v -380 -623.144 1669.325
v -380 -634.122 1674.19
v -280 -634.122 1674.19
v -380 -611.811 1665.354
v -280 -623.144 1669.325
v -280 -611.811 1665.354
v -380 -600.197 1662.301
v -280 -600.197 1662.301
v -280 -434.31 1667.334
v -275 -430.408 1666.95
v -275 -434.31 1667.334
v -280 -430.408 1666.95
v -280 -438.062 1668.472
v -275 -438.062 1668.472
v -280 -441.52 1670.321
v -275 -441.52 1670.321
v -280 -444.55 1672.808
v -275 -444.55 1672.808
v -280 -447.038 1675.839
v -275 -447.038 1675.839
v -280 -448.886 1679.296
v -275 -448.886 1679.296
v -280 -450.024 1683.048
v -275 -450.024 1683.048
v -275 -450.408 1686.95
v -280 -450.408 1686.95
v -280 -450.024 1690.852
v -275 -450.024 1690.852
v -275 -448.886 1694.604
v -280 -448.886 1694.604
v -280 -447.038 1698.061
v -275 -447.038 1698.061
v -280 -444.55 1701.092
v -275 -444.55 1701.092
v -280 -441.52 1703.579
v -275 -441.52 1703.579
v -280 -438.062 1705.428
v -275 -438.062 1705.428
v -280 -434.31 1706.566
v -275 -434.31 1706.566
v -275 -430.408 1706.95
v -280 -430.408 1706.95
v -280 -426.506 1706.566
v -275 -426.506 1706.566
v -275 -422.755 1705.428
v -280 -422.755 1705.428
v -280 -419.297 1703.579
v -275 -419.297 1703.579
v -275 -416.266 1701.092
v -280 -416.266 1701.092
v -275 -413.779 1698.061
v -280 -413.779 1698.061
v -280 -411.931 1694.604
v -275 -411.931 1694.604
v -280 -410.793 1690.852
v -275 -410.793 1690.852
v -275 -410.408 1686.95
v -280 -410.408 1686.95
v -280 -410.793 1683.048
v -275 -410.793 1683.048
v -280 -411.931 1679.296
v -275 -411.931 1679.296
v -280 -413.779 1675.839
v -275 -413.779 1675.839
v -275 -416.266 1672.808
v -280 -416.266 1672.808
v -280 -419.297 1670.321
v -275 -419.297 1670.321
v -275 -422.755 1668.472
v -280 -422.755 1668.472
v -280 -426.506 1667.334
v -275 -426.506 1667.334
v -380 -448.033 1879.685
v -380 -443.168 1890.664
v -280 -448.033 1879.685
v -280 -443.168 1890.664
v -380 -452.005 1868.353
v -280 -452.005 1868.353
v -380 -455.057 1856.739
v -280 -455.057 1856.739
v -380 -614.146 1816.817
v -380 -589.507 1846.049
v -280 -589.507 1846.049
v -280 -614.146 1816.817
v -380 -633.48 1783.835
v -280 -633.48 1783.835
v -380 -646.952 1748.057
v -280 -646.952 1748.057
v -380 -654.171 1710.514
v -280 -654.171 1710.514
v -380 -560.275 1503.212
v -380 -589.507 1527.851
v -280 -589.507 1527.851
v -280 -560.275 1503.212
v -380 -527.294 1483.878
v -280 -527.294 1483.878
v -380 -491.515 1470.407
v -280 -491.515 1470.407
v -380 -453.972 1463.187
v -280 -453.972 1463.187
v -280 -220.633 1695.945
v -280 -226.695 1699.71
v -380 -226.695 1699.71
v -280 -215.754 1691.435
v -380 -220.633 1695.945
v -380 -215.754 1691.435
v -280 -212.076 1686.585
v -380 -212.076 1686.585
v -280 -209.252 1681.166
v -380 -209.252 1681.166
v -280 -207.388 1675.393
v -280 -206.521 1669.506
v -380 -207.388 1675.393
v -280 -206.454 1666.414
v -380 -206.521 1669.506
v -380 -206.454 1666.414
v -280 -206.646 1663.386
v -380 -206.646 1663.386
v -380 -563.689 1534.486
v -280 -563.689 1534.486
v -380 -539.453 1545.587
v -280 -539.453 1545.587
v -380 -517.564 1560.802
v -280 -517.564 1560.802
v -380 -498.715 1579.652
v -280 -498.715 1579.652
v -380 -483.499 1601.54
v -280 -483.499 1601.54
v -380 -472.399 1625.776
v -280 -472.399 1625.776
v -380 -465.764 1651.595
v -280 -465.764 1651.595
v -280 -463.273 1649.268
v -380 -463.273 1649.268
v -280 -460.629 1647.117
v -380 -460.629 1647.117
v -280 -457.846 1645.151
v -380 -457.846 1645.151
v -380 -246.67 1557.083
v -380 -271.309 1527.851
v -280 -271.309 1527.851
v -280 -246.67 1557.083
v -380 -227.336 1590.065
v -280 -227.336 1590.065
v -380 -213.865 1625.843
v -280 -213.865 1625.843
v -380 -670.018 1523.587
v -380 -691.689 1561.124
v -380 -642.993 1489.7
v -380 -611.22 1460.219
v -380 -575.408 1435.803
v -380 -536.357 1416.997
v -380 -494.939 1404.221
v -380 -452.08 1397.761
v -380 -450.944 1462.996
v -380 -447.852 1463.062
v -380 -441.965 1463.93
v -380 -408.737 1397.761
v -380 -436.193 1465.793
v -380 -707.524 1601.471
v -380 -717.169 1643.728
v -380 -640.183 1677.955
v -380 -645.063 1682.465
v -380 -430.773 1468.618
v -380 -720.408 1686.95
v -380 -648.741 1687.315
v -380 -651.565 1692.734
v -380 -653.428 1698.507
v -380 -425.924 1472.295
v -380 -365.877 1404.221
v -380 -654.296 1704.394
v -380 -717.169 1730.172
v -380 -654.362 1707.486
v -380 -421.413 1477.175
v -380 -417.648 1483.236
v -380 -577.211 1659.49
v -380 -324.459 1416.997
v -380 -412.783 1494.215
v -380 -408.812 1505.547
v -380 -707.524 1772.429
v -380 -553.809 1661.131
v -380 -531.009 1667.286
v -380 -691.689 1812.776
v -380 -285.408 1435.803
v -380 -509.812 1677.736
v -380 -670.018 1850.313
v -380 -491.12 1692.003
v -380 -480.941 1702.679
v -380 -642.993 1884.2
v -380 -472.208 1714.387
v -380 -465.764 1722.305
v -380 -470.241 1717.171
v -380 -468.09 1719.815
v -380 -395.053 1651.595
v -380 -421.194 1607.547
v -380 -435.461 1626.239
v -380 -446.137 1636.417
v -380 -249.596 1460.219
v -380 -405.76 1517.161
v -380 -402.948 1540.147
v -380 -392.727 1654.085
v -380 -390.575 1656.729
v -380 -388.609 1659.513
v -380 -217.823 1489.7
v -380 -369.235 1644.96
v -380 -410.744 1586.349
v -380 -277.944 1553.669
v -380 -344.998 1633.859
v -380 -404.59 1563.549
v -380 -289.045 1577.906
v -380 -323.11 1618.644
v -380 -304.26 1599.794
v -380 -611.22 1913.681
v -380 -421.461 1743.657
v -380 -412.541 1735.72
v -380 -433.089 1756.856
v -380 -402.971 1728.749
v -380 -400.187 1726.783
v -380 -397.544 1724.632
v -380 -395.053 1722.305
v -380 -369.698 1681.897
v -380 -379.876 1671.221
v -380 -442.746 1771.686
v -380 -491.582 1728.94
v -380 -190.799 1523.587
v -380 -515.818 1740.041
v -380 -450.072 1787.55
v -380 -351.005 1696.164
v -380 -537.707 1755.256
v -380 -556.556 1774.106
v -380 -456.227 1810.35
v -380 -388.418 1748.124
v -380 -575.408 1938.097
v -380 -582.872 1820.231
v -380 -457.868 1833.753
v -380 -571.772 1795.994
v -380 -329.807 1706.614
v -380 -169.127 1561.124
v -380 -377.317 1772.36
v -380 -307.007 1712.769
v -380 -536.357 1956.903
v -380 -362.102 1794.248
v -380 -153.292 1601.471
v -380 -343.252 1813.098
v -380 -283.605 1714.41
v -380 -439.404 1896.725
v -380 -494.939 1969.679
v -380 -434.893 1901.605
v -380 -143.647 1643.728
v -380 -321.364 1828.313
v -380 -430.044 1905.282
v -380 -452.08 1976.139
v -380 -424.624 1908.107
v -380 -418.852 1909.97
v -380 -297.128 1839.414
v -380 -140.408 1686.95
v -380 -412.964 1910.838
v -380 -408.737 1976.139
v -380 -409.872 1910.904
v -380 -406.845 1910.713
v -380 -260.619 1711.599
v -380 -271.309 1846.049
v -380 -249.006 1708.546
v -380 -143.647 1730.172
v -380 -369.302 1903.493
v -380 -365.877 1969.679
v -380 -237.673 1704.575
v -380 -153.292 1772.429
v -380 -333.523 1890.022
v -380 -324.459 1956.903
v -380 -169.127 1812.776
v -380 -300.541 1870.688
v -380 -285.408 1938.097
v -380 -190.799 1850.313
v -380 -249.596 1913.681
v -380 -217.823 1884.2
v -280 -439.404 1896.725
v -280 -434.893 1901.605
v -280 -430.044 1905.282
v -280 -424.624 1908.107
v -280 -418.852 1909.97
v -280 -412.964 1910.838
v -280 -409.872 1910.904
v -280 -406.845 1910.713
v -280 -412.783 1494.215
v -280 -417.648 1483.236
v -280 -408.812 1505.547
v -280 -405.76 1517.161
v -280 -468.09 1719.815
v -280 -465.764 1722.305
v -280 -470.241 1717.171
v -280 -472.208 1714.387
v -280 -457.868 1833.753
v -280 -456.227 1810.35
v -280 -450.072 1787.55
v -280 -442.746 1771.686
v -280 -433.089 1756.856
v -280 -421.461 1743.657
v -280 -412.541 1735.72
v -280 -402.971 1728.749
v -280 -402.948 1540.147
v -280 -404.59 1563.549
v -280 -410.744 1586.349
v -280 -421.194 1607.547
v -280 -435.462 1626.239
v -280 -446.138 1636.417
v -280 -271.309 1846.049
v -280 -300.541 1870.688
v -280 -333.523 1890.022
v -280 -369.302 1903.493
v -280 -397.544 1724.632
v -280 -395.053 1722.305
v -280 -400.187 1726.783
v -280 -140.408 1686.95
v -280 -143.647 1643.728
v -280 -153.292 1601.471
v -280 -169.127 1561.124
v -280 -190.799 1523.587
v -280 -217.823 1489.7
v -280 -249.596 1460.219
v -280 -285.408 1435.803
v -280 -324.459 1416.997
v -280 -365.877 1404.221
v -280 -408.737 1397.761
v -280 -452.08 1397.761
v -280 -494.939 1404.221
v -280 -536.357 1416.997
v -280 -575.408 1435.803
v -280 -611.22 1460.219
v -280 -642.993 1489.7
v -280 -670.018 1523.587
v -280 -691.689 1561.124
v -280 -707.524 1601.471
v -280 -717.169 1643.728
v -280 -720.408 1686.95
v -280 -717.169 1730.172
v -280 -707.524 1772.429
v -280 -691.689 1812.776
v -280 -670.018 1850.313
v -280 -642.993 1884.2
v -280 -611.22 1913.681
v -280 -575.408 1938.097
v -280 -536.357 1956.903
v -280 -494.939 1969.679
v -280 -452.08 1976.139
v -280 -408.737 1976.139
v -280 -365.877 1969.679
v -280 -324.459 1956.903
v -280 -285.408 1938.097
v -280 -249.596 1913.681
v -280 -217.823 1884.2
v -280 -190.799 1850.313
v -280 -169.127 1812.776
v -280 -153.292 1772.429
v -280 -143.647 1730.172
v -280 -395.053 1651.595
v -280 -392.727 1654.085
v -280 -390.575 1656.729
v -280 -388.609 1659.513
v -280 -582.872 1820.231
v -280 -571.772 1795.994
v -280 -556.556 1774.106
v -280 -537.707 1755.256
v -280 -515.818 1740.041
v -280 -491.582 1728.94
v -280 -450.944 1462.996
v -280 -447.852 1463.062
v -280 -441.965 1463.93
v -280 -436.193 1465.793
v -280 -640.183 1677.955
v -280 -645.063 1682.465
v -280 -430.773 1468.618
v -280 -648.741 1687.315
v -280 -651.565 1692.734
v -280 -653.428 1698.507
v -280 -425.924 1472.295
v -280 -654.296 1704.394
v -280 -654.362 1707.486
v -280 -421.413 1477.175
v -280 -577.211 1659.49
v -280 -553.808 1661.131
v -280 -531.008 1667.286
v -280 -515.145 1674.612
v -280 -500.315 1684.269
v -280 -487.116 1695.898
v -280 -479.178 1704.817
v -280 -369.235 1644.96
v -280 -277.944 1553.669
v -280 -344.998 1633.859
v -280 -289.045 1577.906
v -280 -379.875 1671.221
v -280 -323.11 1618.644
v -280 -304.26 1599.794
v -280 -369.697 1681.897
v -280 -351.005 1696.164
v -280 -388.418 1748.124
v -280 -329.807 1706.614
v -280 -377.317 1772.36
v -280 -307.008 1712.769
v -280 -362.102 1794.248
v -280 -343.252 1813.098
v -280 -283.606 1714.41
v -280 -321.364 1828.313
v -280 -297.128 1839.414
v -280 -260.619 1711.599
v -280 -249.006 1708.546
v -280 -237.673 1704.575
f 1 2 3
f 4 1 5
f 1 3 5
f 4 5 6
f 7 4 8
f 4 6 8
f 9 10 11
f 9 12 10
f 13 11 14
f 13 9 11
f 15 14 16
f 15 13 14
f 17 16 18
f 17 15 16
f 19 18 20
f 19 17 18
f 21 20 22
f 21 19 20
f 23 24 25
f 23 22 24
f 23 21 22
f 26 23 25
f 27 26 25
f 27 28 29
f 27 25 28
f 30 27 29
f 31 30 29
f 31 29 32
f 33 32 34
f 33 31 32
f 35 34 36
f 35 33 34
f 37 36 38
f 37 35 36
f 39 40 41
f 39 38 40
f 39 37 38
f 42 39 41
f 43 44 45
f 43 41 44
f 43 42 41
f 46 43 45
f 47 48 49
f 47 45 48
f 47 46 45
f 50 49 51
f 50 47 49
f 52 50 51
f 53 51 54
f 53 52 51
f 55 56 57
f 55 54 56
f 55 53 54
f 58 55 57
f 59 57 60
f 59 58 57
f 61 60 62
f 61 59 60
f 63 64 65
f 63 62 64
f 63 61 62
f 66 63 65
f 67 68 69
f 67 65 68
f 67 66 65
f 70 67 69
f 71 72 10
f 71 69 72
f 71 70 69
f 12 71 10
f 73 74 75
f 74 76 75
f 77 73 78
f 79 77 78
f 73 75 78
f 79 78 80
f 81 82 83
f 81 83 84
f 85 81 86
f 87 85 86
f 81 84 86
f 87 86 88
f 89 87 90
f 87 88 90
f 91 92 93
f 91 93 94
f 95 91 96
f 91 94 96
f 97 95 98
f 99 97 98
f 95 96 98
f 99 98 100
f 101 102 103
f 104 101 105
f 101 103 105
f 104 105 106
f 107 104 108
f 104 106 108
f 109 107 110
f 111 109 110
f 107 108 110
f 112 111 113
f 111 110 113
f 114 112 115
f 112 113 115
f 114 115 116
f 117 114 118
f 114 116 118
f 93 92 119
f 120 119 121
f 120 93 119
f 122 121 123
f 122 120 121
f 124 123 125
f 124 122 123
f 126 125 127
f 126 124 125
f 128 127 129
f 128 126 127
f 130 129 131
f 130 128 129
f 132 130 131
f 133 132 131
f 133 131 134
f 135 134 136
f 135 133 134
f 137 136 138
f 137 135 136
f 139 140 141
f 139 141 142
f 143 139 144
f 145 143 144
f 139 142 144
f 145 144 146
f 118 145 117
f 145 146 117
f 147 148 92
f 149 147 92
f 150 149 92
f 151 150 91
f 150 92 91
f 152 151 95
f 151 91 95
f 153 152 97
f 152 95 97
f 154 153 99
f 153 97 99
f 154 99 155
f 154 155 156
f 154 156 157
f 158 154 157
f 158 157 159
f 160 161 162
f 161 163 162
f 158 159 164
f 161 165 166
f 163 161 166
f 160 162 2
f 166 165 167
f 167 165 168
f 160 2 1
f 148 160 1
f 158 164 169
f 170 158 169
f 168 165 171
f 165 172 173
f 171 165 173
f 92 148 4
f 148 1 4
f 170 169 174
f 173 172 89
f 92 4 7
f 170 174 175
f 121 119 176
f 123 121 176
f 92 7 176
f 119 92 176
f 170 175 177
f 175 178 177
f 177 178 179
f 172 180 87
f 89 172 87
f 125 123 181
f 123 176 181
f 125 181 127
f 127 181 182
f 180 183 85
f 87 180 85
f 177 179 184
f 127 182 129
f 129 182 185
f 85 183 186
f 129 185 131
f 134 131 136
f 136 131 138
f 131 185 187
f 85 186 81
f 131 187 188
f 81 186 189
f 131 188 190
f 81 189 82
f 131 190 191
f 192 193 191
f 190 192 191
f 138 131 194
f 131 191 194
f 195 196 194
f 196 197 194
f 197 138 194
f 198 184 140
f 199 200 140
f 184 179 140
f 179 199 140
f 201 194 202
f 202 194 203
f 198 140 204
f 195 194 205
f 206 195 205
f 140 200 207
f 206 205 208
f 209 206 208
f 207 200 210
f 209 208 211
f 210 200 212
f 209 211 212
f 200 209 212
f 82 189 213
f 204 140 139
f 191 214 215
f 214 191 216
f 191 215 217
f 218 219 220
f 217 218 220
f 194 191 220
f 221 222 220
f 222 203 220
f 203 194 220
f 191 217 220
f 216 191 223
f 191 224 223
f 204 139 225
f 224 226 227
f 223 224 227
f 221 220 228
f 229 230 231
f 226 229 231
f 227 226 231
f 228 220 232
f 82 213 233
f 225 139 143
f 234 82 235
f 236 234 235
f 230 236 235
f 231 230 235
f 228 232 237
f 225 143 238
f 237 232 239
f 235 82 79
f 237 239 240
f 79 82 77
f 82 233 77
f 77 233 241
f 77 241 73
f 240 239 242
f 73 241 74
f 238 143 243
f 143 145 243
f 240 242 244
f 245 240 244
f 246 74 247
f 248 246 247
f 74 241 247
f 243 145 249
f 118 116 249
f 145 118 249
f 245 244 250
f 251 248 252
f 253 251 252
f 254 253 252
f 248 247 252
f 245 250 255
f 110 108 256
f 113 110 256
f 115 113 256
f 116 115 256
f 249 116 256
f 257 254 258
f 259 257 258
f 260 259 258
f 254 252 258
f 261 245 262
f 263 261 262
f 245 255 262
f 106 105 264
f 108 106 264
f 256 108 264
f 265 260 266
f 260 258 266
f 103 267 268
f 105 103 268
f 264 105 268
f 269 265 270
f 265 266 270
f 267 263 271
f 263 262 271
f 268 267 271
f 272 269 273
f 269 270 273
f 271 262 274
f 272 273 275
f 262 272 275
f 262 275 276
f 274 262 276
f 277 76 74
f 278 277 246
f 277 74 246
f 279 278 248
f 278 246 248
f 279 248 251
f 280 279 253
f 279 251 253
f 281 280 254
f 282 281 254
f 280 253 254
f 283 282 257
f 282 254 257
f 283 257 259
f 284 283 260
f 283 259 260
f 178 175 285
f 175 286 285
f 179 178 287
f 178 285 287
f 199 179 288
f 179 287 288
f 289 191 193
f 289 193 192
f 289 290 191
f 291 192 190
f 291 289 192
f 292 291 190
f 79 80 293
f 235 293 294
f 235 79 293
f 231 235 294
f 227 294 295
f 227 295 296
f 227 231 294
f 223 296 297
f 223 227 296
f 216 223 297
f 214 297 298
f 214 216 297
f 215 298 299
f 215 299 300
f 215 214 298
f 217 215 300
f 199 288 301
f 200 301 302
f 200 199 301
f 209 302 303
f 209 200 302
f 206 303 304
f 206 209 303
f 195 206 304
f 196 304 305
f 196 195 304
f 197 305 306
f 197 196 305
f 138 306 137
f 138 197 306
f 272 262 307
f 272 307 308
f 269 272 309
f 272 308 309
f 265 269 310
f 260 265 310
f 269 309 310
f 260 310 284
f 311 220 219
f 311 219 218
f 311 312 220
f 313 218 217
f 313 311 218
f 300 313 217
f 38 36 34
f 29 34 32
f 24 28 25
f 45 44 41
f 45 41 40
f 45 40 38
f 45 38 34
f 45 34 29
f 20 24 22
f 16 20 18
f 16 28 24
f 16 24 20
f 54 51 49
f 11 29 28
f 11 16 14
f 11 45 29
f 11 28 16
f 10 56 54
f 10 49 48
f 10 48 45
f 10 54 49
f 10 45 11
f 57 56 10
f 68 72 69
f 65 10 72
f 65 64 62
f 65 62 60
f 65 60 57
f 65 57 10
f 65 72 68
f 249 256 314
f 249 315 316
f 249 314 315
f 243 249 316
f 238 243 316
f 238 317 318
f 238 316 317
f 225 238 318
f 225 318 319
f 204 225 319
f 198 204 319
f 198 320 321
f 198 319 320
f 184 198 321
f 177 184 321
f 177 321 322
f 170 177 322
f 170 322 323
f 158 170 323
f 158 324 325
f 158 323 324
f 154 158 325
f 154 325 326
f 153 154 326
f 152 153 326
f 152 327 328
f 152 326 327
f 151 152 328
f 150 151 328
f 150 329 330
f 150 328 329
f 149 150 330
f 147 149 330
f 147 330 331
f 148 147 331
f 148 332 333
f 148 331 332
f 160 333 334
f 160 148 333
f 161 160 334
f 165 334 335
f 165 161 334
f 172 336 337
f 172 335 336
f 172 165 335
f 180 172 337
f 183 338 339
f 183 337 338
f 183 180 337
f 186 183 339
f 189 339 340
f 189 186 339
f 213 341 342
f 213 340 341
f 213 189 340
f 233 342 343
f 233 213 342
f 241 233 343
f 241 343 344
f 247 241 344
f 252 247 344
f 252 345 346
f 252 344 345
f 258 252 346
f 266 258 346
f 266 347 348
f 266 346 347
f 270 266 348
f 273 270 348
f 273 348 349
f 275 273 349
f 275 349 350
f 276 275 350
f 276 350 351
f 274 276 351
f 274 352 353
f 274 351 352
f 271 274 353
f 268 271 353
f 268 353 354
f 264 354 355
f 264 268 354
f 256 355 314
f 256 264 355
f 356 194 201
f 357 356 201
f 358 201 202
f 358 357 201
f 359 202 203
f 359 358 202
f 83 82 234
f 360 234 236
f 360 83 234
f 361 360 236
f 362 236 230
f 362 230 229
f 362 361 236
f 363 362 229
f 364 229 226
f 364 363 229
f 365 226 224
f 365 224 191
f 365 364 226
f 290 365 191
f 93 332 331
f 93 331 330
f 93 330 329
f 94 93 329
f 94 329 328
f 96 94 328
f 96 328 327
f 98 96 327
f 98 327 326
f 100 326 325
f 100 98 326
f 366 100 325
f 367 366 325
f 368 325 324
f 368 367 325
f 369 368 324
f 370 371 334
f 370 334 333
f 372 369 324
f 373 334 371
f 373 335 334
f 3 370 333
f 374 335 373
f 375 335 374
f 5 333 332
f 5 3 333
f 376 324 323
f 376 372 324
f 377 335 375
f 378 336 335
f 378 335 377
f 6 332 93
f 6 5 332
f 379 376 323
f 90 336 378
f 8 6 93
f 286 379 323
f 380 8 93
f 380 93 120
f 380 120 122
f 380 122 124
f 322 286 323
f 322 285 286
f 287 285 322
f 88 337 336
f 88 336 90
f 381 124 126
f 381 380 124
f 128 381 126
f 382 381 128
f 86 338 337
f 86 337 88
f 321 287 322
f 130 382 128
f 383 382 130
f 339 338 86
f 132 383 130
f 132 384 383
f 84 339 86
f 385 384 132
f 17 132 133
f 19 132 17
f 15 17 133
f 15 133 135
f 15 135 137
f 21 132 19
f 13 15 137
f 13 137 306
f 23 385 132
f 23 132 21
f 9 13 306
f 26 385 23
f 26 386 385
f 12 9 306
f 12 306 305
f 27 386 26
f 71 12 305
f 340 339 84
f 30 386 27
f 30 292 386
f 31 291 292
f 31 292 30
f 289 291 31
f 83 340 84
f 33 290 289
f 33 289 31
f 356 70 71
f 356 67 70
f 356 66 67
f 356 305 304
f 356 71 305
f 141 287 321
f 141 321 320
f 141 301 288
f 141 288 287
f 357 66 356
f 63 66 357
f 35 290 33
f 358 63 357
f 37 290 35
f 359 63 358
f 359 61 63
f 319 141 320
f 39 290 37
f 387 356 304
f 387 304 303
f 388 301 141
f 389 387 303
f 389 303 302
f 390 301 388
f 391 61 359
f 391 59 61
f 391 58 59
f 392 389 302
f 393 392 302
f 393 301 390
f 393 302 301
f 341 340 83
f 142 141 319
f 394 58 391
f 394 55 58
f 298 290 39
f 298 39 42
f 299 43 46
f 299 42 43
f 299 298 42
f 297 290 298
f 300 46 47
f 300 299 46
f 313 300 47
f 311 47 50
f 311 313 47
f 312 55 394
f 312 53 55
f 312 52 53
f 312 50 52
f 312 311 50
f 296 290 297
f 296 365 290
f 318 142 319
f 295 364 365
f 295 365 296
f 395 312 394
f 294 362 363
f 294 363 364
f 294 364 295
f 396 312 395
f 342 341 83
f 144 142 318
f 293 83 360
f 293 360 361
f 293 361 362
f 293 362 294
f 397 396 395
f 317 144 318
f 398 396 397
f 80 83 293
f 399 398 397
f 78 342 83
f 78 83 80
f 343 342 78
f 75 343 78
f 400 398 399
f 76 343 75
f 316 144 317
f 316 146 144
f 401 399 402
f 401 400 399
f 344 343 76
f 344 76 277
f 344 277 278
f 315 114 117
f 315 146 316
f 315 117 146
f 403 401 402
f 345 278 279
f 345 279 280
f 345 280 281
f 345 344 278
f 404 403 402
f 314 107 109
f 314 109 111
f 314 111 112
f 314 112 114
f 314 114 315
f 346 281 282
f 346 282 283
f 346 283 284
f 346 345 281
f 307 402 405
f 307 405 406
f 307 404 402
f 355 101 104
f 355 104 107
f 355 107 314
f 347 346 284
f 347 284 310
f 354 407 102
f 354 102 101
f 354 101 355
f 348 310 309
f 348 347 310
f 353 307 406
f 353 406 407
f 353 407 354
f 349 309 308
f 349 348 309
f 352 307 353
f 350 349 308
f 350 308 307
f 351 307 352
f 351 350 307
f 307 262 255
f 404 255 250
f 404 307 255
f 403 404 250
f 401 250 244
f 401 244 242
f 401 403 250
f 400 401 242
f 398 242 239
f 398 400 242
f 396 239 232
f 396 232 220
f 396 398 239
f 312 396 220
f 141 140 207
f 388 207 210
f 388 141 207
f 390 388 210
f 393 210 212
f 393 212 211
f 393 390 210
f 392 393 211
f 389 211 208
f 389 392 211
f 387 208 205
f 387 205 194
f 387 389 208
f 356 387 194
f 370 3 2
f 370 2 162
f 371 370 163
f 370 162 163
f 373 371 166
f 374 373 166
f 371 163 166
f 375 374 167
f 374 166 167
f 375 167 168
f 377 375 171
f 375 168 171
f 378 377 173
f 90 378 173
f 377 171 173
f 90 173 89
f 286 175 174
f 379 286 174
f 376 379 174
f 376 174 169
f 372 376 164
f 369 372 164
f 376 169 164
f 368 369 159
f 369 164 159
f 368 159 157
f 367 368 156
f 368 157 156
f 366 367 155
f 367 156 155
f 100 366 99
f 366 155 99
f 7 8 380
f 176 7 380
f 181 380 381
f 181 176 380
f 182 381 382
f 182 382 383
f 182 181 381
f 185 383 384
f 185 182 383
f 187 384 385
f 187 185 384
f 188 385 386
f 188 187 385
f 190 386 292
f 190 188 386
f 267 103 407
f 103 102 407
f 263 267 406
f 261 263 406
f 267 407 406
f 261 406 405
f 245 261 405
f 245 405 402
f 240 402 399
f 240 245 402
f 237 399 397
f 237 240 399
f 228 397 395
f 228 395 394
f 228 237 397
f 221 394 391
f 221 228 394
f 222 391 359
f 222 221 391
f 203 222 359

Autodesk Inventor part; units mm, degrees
ref_plane "YZ Plane" through (0, 0, 0) normal (1, 0, 0) x (0, 1, 0)
ref_plane "XZ Plane" through (0, 0, 0) normal (0, 1, 0) x (-1, 0, 0)
ref_plane "XY Plane" through (0, 0, 0) normal (0, 0, 1) x (1, 0, 0)
ref_plane "작업 평면1" through (-380, -430.4083, 1686.95) normal (1, 0, 0) x (0, 1, 0)
sketch "스케치1" plane through (-380, -430.4083, 1686.95) normal (1, 0, 0) x (0, 1, 0)
  circle A0 centre (0, 0) radius 290
  point P0 (430.4083, -1686.95)
  dimension "d0" = 580
extrude "돌출1" add sketch "스케치1" along normal blind 100
sketch "스케치3" plane through (-280, -430.4083, 1686.95) normal (1, 0, 0) x (0, 0, -1)
  circle A0 centre (0, 0) radius 225
  circle A1 centre (0, 0) radius 20 projected
  circle A2 centre (0, 0) radius 50
  arc A3 (225, 0) -> (50, 0) centre (137.5, -121.8349) ccw
  arc A4 (0, -225) -> (0, -50) centre (-121.8349, -137.5) ccw
  line L0 (0, 0) -> (159.099, -159.099)
  line L1 (0, 0) -> (225, 0) construction
  line L2 (159.099, -159.099) -> (-159.099, 159.099)
  line L3 (0, 0) -> (159.099, 159.099)
  line L4 (0, 0) -> (225, 0) construction
  line L5 (159.099, 159.099) -> (-159.099, -159.099)
  arc A5 (-159.099, -159.099) -> (-35.3553, -35.3553) centre (-183.3775, -11.0769) ccw
  arc A6 (159.099, 159.099) -> (35.3553, 35.3553) centre (183.3775, 11.0769) ccw
  arc A7 (159.099, -159.099) -> (35.3553, -35.3553) centre (11.0769, -183.3775) ccw
  arc A8 (-225, 0) -> (-50, 0) centre (-137.5, 121.8349) ccw
  arc A9 (-159.099, 159.099) -> (-35.3553, 35.3553) centre (-11.0769, 183.3775) ccw
  arc A10 (0, 225) -> (0, 50) centre (121.8349, 137.5) ccw
  point P0 (1686.95, 430.4083)
  dimension "d6" = 450
  dimension "d7" = 100
  dimension "d10" = 150
  dimension "d11" = 150
  dimension "d12" = 45
  dimension "d13" = 45
  dimension "d14" = 150
  dimension "d16" = 150
  dimension "d17" = 150
  dimension "d18" = 150
  dimension "d19" = 150
  dimension "d20" = 150
extrude "돌출3" cut sketch "스케치3" against normal blind 100 contours A0 A7 A2 A3 | A6 A2 A10 A0 | A0 A5 A2 A4 | A9 A2 A8 A0
fillet "모깎기1" radius 121.75 4 edges at (-330, -380.4083, 1686.95) (-330, -430.4083, 1736.95) (-330, -480.4083, 1686.95) (-330, -430.4083, 1636.95)
fillet "모깎기2" radius 36.25 4 edges at (-330, -205.4083, 1686.95) (-330, -430.4083, 1911.95) (-330, -430.4083, 1461.95) (-330, -655.4083, 1686.95)
sketch "스케치4" plane through (-280, -430.4083, 1686.95) normal (1, 0, 0) x (0, 0, -1)
  circle A0 centre (0, 0) radius 20
  point P0 (1686.95, 430.4083)
  dimension "d25" = 40
extrude "돌출4" add sketch "스케치4" along normal blind 5
properties part number "바퀴"
